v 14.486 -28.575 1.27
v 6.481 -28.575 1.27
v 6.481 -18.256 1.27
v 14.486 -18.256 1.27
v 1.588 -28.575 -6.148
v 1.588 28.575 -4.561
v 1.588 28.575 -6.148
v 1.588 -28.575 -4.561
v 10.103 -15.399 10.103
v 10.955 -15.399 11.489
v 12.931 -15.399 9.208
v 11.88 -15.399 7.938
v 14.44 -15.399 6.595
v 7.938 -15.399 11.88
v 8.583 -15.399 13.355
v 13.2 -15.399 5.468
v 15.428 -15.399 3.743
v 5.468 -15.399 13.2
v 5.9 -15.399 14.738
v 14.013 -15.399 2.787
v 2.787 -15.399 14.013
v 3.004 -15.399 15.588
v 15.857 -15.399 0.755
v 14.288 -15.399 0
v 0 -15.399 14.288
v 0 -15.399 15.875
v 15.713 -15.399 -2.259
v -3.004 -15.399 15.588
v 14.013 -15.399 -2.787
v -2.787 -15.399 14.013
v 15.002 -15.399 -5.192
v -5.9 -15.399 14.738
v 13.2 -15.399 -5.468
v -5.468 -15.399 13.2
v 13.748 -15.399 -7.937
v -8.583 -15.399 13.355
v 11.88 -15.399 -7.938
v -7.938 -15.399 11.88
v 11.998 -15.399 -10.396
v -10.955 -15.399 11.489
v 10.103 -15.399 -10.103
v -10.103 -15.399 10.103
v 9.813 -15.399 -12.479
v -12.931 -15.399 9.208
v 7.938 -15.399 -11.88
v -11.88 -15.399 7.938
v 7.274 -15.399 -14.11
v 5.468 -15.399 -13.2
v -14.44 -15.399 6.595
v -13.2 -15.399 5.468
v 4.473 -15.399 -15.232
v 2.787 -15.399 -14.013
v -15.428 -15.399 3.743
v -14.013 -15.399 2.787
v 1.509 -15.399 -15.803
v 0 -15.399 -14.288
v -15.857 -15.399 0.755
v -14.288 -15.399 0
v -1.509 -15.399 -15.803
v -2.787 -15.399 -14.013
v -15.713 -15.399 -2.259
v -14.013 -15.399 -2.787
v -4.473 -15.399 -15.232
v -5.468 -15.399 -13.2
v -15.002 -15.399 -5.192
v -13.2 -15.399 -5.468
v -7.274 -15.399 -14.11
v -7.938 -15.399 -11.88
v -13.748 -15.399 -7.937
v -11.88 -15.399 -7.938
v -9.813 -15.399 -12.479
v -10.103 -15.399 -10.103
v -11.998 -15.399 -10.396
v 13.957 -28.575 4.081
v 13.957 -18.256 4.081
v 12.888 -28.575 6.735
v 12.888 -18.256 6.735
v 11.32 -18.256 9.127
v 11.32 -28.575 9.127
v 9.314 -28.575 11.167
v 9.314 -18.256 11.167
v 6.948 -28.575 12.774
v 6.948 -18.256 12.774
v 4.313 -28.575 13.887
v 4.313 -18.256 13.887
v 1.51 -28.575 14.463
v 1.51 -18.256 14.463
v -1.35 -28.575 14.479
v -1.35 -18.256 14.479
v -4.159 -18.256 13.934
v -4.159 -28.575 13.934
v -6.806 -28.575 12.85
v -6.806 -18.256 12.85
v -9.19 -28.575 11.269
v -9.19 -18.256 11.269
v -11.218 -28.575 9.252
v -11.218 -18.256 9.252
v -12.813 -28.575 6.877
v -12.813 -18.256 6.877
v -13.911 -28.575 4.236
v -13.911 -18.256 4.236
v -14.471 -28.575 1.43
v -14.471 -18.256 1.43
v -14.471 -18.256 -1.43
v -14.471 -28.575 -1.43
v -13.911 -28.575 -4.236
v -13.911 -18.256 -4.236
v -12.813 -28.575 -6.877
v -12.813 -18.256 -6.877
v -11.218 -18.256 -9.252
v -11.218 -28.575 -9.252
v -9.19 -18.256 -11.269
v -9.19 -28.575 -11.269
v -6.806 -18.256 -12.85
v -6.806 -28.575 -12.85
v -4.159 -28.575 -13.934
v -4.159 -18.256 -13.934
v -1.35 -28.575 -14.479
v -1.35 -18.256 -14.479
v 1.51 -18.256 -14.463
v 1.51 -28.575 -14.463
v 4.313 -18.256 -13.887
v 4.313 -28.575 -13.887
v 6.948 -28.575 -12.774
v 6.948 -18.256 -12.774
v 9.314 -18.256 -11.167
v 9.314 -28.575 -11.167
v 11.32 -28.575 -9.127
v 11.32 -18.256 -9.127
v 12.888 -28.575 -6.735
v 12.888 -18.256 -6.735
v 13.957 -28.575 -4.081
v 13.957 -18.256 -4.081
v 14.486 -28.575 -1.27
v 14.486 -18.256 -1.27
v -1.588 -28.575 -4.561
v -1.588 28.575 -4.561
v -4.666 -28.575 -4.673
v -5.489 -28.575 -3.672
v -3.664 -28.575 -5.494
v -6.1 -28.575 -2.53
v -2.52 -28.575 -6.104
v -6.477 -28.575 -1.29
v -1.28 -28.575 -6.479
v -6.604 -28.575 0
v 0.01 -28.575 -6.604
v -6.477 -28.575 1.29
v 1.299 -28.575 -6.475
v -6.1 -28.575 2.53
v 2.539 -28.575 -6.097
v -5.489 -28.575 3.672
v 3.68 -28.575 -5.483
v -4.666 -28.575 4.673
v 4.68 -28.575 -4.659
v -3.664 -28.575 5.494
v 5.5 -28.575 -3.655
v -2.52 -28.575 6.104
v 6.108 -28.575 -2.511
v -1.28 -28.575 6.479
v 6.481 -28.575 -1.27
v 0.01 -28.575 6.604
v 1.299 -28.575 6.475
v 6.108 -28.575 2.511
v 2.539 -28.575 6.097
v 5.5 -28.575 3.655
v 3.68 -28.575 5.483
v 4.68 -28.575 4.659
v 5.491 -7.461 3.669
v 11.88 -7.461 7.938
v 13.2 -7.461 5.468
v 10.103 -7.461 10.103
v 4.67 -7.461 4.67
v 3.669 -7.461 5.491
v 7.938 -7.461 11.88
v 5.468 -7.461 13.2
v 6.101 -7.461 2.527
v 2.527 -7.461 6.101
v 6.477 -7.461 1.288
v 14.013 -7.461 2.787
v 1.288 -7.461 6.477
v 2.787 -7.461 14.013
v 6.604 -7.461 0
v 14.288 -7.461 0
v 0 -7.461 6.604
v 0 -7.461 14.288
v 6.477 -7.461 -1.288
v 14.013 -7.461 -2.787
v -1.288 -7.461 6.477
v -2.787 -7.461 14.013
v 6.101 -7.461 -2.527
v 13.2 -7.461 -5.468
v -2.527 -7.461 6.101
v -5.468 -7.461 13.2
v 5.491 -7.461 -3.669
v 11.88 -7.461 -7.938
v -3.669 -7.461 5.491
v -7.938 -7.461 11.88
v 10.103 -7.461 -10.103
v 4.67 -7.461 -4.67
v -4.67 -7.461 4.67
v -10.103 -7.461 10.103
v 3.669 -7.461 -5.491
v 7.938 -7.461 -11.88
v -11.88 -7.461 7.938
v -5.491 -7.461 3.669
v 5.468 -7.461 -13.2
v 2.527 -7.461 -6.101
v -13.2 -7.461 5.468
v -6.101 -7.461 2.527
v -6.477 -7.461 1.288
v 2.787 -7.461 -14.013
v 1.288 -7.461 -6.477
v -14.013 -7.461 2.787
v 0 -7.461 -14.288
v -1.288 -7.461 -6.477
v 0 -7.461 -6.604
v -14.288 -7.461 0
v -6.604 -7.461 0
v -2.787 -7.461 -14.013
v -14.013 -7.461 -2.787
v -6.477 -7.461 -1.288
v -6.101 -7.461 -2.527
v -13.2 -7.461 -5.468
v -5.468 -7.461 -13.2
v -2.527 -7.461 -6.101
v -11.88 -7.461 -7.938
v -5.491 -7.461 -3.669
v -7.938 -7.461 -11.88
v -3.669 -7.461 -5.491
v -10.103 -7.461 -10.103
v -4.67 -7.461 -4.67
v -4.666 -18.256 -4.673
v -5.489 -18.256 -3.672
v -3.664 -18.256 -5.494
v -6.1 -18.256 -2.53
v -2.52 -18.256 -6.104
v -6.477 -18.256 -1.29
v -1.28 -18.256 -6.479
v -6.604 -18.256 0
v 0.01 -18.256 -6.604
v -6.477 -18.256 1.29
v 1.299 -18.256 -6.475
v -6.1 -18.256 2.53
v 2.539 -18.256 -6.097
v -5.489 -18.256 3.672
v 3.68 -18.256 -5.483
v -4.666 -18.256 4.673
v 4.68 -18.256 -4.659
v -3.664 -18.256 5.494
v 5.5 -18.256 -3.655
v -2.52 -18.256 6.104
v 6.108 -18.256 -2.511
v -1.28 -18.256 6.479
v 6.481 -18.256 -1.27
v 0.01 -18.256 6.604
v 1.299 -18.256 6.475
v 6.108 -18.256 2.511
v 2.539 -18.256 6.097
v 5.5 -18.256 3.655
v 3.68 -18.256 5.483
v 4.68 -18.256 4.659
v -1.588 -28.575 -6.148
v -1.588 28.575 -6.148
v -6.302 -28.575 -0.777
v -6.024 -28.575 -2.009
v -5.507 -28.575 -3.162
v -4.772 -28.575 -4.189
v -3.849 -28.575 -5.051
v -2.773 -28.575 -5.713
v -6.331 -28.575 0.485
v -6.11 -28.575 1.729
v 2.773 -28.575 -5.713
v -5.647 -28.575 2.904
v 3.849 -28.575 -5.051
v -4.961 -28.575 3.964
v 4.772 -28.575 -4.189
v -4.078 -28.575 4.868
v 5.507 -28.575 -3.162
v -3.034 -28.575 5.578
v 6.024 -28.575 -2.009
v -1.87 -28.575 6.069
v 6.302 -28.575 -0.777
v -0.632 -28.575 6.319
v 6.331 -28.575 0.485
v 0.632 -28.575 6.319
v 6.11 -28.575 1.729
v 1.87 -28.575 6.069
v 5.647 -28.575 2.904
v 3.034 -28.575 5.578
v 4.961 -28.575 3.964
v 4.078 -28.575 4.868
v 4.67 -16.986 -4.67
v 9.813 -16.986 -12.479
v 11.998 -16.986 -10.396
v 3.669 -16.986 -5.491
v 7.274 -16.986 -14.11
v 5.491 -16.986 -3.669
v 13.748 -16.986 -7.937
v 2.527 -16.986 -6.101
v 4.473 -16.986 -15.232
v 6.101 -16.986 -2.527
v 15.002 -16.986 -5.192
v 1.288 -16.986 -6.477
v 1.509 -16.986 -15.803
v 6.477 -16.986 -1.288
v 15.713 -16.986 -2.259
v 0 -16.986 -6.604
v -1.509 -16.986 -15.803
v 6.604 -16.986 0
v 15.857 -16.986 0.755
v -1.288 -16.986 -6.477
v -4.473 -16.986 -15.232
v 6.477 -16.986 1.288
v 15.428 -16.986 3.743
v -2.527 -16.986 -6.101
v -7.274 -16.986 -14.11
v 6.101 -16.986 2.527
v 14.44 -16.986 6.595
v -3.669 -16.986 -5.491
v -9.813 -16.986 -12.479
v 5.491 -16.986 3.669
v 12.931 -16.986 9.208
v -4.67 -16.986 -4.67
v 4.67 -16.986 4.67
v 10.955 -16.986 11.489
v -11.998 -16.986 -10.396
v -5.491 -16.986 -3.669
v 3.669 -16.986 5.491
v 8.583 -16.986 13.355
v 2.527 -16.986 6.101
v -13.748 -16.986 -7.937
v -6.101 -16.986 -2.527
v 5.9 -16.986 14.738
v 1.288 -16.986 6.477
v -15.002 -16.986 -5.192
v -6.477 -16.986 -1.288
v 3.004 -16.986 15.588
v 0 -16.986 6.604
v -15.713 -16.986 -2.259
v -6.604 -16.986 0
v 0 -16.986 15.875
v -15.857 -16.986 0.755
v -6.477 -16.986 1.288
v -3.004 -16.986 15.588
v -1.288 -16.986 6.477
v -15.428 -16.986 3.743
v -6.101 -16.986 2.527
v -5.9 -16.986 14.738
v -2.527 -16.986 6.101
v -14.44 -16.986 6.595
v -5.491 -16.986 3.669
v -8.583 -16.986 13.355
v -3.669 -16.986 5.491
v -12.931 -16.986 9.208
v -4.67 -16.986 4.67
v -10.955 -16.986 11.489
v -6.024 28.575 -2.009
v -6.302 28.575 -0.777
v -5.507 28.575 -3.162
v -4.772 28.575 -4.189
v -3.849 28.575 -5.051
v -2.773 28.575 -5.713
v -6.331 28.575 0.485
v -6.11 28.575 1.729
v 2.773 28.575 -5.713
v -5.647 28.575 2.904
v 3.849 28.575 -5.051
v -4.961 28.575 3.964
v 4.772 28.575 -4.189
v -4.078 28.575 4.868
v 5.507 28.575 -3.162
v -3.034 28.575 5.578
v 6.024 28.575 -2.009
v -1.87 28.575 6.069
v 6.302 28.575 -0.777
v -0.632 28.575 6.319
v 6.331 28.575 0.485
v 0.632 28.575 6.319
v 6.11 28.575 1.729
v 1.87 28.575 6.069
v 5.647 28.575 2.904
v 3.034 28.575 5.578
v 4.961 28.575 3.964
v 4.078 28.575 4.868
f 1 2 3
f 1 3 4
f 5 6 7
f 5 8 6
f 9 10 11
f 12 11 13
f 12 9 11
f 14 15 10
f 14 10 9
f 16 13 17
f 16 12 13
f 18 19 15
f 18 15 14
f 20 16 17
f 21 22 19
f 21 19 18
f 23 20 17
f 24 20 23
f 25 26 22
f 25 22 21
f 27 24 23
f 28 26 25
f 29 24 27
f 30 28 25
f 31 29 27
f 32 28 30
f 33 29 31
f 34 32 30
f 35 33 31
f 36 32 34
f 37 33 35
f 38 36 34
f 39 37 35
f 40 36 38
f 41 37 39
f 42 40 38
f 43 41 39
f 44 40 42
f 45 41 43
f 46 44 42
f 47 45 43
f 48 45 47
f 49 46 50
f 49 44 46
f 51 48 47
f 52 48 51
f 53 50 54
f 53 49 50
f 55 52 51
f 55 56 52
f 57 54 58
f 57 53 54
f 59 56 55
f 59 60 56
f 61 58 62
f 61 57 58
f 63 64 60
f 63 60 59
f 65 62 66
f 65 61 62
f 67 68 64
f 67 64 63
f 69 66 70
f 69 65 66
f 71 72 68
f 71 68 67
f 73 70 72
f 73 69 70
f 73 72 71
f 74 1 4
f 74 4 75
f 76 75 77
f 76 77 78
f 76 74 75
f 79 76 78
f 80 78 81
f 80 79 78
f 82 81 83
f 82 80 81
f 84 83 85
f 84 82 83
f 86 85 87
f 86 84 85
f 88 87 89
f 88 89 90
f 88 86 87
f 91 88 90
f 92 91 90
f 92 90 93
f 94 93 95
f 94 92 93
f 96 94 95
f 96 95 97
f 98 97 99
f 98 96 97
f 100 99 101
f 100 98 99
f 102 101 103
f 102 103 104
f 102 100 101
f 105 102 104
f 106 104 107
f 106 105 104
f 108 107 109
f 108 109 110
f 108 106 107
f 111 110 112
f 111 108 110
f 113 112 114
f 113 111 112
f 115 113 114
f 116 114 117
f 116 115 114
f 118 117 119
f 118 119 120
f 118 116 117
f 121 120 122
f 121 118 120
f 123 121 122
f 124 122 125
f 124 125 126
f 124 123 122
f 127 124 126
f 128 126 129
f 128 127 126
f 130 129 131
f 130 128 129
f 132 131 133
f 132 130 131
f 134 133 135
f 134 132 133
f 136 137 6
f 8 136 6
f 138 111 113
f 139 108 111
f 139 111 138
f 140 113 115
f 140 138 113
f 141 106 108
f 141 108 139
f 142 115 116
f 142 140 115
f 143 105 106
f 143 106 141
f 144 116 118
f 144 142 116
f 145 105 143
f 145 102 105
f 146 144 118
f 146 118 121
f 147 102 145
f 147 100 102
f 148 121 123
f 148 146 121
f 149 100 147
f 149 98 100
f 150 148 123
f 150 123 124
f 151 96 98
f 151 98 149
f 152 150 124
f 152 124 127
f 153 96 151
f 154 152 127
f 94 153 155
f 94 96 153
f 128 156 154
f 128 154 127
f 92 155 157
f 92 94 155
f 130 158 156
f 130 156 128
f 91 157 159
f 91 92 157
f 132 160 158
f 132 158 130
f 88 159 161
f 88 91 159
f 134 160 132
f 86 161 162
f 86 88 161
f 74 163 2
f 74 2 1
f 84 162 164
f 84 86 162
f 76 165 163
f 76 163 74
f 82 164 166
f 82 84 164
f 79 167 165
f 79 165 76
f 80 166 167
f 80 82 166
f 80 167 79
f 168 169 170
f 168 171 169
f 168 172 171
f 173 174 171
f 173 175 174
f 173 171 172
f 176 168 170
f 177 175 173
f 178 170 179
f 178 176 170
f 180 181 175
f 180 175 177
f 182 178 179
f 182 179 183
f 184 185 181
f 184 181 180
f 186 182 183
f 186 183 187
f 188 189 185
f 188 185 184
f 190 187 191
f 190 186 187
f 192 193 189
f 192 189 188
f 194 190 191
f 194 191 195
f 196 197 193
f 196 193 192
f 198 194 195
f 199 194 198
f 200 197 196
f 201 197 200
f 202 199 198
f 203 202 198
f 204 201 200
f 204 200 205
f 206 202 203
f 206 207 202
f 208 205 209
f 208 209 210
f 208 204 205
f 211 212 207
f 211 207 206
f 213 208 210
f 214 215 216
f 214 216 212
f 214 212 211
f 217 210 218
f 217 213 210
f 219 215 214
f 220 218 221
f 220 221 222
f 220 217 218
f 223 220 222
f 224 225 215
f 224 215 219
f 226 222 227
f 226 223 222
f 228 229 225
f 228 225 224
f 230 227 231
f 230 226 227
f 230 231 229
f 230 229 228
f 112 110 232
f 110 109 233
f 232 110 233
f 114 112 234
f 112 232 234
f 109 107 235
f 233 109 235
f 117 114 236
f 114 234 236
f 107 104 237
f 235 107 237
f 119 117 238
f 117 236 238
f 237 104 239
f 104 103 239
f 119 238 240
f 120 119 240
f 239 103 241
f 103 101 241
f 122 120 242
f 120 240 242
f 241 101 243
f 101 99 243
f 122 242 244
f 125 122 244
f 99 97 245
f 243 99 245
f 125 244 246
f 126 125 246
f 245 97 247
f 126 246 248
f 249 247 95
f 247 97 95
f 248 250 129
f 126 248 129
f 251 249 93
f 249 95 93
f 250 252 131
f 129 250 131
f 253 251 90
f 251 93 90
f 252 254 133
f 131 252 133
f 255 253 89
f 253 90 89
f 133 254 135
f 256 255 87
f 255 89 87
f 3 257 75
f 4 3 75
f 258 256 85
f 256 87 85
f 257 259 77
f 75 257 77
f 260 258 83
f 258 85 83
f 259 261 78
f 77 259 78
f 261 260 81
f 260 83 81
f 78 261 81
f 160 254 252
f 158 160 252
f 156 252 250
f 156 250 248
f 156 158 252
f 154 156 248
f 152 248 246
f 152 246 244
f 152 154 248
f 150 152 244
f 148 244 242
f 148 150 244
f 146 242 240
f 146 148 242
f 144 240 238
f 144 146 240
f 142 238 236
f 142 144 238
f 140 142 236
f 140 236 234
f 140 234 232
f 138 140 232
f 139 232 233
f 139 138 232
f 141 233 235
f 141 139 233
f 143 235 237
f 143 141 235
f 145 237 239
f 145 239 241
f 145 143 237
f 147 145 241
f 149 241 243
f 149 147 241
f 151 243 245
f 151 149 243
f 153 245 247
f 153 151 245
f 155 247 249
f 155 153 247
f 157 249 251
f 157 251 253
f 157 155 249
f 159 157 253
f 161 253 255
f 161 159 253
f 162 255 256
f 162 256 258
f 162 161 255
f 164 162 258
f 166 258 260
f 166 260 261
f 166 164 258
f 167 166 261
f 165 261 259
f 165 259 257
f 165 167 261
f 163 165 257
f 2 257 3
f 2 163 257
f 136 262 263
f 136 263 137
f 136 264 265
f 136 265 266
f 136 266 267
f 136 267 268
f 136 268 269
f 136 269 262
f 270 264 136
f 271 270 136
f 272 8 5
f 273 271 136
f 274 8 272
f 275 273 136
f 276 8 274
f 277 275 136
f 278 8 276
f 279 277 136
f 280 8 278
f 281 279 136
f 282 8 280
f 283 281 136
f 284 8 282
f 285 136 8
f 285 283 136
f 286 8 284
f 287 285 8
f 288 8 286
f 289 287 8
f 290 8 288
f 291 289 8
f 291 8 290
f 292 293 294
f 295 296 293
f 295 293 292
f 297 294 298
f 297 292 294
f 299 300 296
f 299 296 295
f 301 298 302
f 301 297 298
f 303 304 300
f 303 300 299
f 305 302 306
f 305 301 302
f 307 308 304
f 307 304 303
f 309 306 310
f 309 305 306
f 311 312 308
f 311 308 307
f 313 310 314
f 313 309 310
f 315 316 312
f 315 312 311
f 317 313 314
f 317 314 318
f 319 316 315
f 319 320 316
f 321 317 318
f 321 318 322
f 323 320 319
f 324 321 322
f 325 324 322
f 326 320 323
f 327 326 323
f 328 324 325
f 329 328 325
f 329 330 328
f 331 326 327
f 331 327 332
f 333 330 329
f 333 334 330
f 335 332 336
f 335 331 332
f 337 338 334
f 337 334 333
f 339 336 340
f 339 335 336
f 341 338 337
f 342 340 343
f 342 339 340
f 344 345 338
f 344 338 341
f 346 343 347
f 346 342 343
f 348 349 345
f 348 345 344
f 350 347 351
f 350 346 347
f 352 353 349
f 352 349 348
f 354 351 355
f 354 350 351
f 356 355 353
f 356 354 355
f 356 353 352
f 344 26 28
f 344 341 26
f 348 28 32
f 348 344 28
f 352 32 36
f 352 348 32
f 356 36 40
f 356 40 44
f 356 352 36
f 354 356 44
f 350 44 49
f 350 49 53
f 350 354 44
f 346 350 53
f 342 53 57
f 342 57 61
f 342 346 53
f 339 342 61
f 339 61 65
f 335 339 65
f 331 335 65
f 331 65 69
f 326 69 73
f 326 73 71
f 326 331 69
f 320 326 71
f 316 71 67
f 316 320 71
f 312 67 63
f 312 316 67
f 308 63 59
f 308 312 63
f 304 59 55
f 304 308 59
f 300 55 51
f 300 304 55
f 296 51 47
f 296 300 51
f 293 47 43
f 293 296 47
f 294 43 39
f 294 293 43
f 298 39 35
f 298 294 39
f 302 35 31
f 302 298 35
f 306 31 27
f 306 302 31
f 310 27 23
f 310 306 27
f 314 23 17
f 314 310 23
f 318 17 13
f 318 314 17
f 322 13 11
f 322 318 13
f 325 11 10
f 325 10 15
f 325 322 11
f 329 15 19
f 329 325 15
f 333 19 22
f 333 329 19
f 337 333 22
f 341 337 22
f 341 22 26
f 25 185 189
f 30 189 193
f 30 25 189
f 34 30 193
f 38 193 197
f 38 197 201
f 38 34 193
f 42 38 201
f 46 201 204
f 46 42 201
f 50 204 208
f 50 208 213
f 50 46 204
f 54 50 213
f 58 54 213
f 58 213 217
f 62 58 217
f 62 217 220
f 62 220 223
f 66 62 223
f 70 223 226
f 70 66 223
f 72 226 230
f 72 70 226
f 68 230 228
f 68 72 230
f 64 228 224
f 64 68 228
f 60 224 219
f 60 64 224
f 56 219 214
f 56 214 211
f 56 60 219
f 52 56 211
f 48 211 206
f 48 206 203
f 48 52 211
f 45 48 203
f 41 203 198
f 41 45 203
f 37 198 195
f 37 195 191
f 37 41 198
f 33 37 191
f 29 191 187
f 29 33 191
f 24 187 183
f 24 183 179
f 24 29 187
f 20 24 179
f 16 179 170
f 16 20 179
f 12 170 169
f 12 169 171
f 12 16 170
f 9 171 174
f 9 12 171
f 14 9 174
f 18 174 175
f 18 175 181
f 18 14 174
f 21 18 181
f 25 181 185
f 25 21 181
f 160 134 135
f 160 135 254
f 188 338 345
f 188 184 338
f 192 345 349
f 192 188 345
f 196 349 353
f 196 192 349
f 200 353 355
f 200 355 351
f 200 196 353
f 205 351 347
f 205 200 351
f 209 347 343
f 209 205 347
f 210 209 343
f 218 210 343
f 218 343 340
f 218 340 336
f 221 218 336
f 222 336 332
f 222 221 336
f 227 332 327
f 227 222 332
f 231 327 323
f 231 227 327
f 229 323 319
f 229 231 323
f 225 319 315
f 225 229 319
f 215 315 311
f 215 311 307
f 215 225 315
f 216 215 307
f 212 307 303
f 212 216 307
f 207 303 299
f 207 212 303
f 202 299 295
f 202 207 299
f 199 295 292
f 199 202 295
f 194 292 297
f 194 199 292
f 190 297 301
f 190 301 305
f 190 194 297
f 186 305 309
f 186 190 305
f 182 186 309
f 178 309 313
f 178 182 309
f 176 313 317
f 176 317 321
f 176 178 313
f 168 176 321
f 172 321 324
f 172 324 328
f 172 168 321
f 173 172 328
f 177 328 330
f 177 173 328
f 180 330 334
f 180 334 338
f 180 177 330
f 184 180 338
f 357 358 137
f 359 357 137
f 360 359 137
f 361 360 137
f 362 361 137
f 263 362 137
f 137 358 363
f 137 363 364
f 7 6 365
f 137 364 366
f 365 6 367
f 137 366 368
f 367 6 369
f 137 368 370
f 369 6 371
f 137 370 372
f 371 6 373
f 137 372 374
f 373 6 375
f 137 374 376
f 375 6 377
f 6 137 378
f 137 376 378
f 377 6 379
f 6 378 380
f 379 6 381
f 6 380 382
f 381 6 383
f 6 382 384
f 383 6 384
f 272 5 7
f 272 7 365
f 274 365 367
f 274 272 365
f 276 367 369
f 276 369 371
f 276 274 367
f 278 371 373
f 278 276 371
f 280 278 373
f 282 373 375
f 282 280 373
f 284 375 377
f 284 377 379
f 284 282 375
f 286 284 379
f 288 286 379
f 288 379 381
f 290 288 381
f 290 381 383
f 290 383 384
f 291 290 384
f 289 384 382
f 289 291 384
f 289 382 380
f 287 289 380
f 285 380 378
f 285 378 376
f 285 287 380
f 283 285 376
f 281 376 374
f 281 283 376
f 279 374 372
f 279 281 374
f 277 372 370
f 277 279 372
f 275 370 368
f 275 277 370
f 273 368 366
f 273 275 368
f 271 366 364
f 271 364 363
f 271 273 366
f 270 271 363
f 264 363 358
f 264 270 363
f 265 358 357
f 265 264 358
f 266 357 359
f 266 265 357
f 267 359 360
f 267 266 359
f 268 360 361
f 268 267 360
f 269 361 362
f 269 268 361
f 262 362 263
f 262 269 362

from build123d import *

# Parameters (mm, degrees)
F1_DEPTH = 28.575
F3_DEPTH = 10.31875


with BuildPart() as f1:
    # F0 (on Front) → F1 (new body, symmetric)
    with BuildSketch(Plane.XZ):
        with BuildLine():
            Line((1.5875, -4.560861), (1.5875, -6.148361))
            ThreePointArc((1.5875, -6.148361), (0, 6.35), (-1.5875, -6.148361))
            Line((-1.5875, -6.148361), (-1.5875, -4.560861))
            Line((-1.5875, -4.560861), (0, -4.560861))
            Line((0, -4.560861), (1.5875, -4.560861))
        make_face()
    extrude(amount=F1_DEPTH, both=True)


with BuildPart() as f3:
    # F2 (on face) → F3 (new body)
    with BuildSketch(Plane.XZ.offset(28.575)):
        with BuildLine():
            ThreePointArc((6.480734, -1.27), (-6.604, 0), (6.480734, 1.27))
            Line((6.480734, 1.27), (14.485935, 1.27))
            ThreePointArc((14.485935, 1.27), (-14.5415, 0), (14.485935, -1.27))
            Line((14.485935, -1.27), (6.480734, -1.27))
        make_face()
    extrude(amount=-F3_DEPTH)


with BuildPart() as f5:
    # F4 (on Right) → F5 (revolve)
    with BuildSketch(Plane.YZ):
        Polygon((-16.98625, 15.875), (-16.98625, 6.604), (-7.46125, 6.604), (-7.46125, 14.2875), (-15.39875, 14.2875), (-15.39875, 15.875), align=None)
    revolve(axis=Axis((0, -14.2875, 0), (0, -1, 0)))


solid = Compound([f1.part, f3.part, f5.part])
